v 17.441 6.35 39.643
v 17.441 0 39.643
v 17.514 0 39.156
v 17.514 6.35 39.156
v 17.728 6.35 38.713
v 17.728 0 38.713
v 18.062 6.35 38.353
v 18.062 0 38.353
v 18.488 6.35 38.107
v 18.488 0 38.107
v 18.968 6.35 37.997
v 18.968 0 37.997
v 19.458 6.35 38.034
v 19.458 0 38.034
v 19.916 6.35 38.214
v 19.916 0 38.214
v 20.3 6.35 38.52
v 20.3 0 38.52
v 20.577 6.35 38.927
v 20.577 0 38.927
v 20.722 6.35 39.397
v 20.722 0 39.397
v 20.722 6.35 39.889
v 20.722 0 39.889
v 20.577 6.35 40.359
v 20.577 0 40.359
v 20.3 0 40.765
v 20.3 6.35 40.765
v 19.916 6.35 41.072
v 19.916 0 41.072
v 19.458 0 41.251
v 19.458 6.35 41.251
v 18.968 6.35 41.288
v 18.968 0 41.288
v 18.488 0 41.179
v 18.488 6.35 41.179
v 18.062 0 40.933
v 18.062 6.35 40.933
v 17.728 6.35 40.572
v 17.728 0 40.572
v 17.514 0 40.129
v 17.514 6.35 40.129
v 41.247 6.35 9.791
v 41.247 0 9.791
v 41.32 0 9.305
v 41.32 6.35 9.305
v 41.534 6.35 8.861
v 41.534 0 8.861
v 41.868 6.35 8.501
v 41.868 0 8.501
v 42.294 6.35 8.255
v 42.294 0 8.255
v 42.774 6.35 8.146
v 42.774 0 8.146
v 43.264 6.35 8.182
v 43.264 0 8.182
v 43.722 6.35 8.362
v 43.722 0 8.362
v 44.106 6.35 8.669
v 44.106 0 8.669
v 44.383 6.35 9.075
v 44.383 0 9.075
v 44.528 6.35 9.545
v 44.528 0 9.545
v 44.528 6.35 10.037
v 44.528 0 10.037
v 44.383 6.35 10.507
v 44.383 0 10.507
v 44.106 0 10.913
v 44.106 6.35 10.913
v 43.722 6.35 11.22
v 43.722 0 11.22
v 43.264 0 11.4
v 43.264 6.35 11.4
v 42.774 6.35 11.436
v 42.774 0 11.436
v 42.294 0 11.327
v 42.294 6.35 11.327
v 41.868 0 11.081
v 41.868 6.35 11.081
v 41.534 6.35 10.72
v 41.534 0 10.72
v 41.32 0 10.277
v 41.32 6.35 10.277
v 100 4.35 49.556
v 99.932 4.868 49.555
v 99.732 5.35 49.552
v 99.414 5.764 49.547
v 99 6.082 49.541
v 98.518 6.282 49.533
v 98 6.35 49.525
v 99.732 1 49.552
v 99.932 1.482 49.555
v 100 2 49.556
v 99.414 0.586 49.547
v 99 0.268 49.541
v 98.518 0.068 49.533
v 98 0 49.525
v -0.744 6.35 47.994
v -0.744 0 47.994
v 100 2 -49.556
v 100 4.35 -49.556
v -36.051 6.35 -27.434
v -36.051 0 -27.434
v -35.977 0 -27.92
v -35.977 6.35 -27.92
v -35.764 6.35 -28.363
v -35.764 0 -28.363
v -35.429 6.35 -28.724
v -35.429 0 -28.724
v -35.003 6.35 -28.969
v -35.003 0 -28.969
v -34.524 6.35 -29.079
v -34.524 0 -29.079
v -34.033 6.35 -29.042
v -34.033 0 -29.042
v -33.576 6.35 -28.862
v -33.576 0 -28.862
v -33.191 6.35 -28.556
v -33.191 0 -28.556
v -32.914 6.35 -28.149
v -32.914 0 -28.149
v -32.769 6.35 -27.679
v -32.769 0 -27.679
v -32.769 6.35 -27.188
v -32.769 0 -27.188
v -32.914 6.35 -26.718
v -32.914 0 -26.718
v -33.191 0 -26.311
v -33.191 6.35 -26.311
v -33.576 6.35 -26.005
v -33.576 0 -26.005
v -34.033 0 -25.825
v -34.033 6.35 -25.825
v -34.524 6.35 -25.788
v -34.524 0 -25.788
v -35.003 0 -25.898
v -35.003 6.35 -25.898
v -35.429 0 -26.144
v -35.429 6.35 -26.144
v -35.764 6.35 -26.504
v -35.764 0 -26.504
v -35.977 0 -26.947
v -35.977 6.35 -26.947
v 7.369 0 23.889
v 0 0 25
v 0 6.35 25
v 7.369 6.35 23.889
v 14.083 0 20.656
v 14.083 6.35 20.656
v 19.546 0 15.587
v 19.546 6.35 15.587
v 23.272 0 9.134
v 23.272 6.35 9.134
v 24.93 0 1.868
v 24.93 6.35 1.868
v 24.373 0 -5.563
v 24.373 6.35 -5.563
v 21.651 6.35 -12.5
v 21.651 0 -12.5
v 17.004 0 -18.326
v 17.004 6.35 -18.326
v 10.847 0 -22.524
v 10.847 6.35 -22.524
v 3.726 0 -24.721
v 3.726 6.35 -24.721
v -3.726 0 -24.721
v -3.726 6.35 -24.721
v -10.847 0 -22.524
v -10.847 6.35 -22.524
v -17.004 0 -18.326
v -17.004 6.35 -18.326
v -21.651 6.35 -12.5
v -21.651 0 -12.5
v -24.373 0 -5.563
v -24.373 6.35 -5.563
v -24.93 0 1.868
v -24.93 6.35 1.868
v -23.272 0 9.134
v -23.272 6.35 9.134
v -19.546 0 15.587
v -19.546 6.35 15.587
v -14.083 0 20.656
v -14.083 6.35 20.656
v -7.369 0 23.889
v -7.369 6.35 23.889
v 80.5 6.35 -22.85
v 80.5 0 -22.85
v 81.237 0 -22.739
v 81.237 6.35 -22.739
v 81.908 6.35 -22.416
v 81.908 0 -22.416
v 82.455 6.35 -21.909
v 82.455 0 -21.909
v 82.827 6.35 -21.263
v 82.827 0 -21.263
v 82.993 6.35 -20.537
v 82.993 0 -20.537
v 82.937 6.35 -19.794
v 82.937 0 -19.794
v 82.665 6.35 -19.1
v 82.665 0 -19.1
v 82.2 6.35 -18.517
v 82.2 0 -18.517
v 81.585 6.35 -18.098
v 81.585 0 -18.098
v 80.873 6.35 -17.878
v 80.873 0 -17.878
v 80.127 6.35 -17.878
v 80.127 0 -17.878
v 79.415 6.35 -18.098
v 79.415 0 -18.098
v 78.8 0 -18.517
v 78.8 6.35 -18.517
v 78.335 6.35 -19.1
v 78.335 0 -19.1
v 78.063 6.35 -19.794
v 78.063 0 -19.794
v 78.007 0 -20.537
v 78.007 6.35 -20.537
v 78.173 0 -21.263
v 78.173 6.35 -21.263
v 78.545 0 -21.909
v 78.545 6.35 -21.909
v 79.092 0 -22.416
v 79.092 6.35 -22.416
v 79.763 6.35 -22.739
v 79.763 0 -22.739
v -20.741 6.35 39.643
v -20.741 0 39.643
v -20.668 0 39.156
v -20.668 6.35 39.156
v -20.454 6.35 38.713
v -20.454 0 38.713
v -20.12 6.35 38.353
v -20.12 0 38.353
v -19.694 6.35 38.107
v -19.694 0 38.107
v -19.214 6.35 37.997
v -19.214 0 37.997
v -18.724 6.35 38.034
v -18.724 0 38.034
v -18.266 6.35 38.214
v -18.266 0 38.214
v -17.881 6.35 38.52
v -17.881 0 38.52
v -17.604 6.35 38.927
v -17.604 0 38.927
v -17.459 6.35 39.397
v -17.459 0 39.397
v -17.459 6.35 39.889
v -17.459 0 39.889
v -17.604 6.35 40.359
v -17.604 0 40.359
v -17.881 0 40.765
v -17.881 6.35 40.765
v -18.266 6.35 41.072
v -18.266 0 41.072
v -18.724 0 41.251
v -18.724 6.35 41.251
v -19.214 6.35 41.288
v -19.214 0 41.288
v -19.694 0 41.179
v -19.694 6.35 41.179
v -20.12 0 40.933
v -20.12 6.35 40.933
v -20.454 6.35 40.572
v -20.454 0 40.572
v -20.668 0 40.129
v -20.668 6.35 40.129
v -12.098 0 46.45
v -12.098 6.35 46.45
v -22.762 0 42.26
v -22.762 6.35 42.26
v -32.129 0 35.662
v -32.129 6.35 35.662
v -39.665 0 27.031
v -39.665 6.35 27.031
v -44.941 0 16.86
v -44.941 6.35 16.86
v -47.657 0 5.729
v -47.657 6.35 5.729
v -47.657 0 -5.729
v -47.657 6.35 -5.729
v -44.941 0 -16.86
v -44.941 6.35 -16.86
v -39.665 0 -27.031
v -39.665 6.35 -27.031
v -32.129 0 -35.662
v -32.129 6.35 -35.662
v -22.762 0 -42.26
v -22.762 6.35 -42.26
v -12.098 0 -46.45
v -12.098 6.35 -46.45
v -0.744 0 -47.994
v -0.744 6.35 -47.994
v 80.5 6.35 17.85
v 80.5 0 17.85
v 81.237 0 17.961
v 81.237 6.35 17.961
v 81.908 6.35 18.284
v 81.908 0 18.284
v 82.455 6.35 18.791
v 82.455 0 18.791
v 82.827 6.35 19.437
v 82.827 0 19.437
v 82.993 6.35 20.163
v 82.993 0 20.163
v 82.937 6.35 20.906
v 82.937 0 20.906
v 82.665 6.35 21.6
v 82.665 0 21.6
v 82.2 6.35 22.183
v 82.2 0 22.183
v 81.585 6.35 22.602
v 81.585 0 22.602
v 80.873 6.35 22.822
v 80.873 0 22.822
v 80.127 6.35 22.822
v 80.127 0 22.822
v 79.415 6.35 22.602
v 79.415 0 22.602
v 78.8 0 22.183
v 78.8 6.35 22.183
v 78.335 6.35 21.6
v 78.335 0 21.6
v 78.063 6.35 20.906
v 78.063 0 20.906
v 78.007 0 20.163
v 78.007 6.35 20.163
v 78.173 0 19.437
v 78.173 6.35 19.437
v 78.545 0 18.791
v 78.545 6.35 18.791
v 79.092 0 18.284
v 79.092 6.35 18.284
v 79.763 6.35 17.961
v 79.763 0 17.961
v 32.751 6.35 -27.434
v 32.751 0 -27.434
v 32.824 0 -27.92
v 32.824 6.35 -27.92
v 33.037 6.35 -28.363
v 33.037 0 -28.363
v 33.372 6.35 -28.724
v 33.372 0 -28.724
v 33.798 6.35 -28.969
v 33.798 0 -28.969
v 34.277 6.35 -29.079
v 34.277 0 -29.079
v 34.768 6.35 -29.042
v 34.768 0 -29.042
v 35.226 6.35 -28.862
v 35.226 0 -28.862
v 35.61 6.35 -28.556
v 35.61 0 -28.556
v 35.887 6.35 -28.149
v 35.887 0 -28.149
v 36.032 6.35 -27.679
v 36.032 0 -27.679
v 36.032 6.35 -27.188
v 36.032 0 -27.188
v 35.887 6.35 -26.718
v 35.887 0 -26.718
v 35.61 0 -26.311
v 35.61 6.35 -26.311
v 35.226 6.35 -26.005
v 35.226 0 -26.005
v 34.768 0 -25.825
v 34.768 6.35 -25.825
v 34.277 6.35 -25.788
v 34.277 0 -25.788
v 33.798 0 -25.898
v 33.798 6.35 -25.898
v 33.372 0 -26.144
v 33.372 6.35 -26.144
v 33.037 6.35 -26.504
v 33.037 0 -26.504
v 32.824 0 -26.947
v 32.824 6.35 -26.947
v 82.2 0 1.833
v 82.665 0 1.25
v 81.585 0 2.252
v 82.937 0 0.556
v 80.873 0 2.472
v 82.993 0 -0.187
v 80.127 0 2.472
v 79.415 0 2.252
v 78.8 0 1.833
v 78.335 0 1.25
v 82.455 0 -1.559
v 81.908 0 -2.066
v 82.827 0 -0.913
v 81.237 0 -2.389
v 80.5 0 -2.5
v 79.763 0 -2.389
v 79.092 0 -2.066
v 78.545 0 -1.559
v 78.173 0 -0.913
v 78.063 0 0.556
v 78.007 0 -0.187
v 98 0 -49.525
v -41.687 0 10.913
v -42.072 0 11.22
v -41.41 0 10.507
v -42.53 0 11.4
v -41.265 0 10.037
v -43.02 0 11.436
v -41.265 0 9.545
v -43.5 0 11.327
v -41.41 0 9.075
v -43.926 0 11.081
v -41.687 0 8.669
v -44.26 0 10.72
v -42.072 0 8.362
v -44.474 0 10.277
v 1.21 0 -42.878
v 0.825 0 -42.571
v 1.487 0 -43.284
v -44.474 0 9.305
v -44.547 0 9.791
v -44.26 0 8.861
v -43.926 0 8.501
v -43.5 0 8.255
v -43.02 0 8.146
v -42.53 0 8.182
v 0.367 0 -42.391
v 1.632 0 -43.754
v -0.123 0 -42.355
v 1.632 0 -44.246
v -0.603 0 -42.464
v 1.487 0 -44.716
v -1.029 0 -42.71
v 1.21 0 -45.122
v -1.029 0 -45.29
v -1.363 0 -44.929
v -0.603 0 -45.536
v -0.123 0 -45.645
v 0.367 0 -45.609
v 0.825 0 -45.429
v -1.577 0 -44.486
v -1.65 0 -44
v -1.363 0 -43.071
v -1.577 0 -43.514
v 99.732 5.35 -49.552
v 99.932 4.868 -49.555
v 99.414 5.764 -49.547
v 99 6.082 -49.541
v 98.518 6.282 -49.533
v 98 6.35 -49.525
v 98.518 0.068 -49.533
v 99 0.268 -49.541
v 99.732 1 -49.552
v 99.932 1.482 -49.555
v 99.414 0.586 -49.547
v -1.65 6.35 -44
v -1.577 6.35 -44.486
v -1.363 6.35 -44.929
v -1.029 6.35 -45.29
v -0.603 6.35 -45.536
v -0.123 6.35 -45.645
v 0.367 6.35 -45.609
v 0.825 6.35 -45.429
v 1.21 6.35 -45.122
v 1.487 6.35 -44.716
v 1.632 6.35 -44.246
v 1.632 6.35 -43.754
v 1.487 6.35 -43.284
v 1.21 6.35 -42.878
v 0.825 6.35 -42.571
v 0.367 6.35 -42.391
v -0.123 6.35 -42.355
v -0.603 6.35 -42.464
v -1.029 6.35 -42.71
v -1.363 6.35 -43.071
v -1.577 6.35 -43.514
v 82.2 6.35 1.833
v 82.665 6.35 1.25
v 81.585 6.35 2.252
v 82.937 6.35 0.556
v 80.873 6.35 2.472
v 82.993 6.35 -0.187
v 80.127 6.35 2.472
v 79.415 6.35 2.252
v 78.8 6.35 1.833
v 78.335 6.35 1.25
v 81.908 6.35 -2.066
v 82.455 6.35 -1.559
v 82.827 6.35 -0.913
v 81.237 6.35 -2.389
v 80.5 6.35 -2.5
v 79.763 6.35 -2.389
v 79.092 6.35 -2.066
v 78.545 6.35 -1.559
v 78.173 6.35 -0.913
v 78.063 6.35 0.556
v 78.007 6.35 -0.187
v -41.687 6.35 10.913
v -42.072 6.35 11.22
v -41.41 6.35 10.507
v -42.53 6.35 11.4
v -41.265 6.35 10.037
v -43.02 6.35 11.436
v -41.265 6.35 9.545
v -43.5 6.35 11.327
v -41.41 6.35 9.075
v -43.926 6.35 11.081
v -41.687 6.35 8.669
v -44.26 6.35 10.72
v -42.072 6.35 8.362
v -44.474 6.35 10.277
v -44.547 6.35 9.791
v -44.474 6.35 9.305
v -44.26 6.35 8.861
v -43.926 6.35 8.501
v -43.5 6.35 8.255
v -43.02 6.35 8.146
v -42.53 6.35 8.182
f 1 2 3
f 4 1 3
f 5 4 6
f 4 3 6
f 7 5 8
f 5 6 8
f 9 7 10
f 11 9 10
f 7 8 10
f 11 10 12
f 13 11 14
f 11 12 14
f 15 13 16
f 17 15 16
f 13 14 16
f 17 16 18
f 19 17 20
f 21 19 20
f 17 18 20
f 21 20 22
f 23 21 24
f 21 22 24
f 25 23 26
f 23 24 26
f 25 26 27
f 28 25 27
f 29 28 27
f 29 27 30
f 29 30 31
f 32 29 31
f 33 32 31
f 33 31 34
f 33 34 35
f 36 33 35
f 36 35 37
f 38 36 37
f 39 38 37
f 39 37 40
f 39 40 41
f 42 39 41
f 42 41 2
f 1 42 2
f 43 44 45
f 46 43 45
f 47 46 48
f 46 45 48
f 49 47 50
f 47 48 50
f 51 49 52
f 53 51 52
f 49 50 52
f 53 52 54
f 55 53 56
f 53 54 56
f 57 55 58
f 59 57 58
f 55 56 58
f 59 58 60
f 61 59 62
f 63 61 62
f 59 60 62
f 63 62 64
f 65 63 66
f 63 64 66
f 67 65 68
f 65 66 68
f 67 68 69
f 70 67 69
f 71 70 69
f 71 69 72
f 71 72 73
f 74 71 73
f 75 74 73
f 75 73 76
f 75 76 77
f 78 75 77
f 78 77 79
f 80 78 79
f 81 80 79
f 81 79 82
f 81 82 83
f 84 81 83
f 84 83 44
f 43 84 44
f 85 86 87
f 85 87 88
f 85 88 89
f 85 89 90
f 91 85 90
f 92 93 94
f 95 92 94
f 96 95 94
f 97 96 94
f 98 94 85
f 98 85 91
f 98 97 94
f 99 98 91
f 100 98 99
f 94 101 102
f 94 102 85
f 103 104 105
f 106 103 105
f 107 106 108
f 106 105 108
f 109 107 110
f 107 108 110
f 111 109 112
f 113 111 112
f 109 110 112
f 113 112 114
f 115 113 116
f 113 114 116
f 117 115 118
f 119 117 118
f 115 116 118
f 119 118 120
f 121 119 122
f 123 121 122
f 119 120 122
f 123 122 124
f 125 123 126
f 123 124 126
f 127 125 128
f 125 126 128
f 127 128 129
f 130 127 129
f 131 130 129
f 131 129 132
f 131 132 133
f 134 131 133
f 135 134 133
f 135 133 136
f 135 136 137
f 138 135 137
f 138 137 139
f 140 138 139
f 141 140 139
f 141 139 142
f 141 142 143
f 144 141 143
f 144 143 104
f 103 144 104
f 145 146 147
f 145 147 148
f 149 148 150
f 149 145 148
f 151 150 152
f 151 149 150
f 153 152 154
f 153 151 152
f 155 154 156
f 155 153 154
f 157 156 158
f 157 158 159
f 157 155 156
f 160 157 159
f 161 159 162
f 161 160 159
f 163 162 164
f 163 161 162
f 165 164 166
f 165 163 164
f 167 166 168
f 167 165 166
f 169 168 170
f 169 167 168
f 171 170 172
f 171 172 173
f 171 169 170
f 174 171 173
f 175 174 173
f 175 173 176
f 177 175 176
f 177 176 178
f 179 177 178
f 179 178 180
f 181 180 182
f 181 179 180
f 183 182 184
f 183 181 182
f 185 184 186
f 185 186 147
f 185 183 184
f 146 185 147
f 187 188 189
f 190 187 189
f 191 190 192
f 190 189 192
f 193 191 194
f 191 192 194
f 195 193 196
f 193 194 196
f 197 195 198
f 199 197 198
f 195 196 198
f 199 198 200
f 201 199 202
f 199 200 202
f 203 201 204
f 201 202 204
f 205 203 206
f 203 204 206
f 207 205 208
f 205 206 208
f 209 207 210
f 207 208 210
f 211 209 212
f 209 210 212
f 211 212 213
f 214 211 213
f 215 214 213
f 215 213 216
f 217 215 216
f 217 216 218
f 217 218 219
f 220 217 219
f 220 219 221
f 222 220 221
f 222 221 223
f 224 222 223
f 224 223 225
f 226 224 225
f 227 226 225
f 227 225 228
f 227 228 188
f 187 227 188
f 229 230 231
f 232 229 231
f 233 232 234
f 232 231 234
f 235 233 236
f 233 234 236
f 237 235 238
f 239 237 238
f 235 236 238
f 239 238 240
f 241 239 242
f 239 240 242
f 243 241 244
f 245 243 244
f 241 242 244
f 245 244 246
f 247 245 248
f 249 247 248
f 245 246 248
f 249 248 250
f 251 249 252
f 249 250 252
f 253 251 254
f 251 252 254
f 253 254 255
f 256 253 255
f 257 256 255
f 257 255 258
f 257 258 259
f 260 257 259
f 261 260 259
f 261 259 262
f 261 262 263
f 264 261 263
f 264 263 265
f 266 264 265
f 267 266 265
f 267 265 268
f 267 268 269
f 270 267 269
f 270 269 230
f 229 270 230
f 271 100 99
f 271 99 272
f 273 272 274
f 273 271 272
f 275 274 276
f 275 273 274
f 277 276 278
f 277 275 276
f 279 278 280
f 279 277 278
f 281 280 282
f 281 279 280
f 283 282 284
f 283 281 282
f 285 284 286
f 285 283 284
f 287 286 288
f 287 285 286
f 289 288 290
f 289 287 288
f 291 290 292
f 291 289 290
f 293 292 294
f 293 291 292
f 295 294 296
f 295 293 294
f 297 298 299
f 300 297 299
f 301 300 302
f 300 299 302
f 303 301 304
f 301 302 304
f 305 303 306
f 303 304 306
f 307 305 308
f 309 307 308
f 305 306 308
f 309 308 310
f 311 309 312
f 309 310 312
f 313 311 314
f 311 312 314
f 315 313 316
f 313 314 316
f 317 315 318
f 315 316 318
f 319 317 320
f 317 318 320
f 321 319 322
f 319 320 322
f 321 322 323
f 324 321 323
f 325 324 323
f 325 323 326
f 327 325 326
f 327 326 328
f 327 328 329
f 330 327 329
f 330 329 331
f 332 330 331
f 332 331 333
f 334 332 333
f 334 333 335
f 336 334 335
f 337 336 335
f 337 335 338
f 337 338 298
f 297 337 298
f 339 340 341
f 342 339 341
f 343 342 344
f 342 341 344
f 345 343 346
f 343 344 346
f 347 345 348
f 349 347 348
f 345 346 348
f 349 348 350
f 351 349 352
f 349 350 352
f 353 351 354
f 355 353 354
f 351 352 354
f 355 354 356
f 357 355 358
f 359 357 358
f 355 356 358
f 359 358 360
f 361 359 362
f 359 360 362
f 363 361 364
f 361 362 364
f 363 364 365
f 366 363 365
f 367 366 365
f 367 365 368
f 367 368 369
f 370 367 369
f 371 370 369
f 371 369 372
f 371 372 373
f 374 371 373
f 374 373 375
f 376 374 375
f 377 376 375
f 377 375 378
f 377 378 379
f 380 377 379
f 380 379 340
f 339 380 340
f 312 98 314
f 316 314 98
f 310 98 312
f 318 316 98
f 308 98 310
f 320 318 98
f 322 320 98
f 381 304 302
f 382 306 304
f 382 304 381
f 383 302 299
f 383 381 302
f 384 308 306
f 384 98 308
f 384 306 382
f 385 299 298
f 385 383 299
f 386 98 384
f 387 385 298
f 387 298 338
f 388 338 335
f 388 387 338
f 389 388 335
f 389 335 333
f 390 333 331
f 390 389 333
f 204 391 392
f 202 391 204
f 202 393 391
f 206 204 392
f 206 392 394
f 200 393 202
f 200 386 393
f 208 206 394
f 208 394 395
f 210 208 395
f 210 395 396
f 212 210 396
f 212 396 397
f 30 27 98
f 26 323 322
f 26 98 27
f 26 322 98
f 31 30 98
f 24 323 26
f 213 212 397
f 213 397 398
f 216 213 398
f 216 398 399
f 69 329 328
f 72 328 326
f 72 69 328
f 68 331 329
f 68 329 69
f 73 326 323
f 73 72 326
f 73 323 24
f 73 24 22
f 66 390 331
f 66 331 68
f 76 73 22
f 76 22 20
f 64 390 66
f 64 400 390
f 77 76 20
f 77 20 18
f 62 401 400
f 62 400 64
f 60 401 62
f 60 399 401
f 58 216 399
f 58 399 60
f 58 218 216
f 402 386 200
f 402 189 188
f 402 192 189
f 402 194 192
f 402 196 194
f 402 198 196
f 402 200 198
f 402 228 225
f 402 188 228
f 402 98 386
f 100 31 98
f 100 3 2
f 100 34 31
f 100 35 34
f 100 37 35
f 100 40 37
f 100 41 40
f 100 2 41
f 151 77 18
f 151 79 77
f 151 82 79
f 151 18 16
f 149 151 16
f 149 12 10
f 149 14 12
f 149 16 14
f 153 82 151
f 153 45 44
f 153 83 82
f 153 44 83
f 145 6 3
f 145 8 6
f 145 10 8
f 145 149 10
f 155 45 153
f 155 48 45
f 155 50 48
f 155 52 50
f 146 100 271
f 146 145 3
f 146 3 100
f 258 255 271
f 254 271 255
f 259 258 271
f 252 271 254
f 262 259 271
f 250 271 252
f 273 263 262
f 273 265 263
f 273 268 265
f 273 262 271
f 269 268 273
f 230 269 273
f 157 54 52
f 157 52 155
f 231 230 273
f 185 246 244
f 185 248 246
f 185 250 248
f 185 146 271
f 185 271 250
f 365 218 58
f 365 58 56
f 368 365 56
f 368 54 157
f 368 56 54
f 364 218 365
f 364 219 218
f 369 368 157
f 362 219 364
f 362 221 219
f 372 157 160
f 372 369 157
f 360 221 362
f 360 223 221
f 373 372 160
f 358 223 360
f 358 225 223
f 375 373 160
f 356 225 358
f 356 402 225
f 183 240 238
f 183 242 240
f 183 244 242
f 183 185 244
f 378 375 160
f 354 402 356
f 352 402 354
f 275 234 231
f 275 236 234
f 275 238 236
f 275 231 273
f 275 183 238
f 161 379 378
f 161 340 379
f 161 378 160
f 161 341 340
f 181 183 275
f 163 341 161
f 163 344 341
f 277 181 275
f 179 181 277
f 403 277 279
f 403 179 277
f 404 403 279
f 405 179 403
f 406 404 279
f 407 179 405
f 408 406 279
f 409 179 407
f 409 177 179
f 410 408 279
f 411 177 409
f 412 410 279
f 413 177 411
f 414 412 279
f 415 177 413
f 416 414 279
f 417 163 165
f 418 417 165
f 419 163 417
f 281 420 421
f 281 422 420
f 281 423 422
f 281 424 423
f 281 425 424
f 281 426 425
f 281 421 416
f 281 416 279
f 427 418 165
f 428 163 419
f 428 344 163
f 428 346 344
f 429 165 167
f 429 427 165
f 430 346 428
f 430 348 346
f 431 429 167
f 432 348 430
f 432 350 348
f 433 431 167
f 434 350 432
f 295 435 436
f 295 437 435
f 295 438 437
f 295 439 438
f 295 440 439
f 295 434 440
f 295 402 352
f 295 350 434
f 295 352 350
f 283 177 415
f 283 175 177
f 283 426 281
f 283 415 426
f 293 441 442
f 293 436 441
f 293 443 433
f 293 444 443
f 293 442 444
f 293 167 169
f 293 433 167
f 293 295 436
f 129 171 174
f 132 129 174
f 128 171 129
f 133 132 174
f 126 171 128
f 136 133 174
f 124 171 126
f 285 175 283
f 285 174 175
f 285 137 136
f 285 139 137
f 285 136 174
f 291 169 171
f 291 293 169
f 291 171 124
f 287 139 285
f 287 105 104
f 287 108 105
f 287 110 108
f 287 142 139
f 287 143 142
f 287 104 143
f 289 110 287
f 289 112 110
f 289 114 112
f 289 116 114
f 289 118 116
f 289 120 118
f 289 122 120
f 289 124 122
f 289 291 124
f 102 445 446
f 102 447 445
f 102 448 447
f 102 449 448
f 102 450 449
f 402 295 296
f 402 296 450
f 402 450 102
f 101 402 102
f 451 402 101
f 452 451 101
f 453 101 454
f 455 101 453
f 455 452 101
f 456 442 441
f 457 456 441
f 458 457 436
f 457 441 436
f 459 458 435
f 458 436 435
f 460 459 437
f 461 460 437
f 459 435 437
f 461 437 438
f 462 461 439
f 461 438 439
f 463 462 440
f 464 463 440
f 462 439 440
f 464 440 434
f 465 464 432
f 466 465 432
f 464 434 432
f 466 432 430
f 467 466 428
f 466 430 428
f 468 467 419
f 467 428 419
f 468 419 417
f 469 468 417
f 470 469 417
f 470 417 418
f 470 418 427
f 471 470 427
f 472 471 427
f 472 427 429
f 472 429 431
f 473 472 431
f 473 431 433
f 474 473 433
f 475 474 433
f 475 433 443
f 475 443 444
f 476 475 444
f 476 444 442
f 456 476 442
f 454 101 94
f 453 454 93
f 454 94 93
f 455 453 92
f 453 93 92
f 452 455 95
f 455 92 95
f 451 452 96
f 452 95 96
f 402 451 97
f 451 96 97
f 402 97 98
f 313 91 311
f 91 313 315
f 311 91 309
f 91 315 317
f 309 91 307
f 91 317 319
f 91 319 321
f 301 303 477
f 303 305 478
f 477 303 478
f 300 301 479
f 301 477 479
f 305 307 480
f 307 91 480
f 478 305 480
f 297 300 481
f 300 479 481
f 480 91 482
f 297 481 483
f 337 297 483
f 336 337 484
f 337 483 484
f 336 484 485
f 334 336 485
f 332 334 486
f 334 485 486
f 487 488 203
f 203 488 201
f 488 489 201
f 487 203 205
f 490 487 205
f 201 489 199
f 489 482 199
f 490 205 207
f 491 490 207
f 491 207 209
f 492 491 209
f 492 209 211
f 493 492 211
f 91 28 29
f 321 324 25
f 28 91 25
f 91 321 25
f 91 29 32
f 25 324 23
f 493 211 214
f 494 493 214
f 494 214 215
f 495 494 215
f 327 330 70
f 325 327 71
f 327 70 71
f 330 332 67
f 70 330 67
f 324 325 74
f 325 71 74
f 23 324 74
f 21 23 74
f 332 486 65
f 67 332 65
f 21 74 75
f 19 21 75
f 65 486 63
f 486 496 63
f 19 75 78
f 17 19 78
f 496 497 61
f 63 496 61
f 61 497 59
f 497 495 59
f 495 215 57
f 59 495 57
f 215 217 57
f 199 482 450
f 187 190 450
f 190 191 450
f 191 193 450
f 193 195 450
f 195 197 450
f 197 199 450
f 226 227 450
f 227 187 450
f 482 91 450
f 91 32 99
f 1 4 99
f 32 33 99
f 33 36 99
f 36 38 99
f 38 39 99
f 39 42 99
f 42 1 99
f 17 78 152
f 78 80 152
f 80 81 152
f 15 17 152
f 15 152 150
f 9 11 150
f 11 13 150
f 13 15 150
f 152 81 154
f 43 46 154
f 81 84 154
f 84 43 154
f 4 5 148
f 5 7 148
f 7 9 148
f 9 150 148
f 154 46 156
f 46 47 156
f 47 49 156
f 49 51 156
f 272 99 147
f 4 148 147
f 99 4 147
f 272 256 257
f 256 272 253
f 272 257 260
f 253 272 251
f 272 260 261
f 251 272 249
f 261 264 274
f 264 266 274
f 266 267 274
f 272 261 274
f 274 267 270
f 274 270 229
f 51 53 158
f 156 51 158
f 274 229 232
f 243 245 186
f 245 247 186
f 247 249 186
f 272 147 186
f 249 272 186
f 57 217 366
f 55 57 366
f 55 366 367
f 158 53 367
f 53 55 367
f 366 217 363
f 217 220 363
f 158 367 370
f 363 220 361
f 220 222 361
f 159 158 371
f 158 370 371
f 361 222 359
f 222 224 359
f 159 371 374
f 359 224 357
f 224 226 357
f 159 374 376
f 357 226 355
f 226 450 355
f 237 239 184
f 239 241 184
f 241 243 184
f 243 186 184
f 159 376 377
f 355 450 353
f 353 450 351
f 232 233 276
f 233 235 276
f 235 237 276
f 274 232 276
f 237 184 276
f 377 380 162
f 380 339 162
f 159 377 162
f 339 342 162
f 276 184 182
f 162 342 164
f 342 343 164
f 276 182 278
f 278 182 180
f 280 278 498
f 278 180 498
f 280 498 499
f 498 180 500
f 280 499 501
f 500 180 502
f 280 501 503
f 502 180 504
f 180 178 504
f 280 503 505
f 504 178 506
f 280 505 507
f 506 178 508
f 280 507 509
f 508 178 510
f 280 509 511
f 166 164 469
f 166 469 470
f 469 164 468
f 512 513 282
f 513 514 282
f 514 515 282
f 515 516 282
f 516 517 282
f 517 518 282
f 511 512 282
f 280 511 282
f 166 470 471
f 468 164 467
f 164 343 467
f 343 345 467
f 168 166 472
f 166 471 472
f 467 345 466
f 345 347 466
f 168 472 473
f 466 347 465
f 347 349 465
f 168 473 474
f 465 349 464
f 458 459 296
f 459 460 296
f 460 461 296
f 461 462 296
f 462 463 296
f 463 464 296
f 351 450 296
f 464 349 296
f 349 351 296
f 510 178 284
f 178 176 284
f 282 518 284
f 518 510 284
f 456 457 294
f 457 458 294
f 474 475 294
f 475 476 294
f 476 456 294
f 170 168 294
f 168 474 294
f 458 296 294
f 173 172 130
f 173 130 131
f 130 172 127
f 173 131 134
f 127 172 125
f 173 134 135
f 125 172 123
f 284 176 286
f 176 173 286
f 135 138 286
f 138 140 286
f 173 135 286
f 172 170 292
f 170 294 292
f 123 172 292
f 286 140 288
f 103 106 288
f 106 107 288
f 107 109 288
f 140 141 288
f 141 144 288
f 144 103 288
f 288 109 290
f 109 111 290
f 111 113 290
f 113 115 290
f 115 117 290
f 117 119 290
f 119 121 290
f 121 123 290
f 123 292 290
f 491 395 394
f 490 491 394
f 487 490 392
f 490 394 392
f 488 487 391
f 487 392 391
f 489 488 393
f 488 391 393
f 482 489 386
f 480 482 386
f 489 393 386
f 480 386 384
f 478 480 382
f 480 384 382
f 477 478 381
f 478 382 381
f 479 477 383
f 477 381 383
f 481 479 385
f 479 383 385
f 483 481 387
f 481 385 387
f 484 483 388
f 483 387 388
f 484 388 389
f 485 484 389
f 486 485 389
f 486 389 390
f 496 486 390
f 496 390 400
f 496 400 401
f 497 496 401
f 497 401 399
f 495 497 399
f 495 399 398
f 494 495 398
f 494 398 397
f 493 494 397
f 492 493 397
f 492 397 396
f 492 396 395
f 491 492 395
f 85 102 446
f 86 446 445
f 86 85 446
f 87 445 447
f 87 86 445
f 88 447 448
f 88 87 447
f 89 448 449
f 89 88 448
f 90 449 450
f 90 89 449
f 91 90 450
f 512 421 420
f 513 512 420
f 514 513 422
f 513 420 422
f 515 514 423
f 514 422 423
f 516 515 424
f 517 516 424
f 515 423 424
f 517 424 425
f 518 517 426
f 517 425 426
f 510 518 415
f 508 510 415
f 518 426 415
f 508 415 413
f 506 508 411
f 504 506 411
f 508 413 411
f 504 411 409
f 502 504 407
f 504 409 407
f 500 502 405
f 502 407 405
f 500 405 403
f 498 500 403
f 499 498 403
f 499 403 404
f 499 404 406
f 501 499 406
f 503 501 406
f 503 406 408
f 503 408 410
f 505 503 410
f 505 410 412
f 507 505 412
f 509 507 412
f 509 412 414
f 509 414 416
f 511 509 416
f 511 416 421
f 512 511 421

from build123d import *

# Parameters (mm, degrees)
SKETCH1_R                 = 0.5
SKETCH1_R_2               = 25
BOSS_EXTRUDE1_DEPTH       = 6.35
M6X1_0_TAPPED_HOLE1_D     = 5
M6X1_0_TAPPED_HOLE1_DEPTH = 15
M6X1_0_TAPPED_HOLE1_TIP   = 1.502151548
M4X0_7_TAPPED_HOLE1_D     = 3.3
M4X0_7_TAPPED_HOLE1_DEPTH = 10.1
M4X0_7_TAPPED_HOLE1_TIP   = 0.991420021
FILLET1_R                 = 2


with BuildPart() as part:
    # Sketch1 → Boss-Extrude1 (new body)
    with BuildSketch(Plane(origin=(0, 0, 0), x_dir=(1, 0, 0), z_dir=(0, 1, 0))):
        with BuildLine():
            Line((100, -49.556343888), (100, 49.556343888))
            Line((100, 49.556343888), (-0.744186047, 47.994230769))
            ThreePointArc((-0.744186047, 47.994230769), (-48, 0), (-0.744186047, -47.994230769))
            Line((-0.744186047, -47.994230769), (100, -49.556343888))
        make_face()
        with Locations((80.5, -20.35)):
            Circle(SKETCH1_R, mode=Mode.SUBTRACT)
        Circle(SKETCH1_R_2, mode=Mode.SUBTRACT)
        with Locations((80.5, 0)):
            Circle(SKETCH1_R, mode=Mode.SUBTRACT)
        with Locations((80.5, 20.35)):
            Circle(SKETCH1_R, mode=Mode.SUBTRACT)
    extrude(amount=BOSS_EXTRUDE1_DEPTH)

    # M6x1.0 Tapped Hole1
    with Locations(Plane(origin=(80.5, 6.35, -20.35), x_dir=(0, 0, 1), z_dir=(0, 1, 0))):
        with Locations((0, 0), (20.35, 0), (40.7, 0)):
            Hole(M6X1_0_TAPPED_HOLE1_D / 2, depth=M6X1_0_TAPPED_HOLE1_DEPTH)
            with Locations((0, 0, -(M6X1_0_TAPPED_HOLE1_DEPTH + M6X1_0_TAPPED_HOLE1_TIP / 2))):  # 118° drill point
                Cone(0, M6X1_0_TAPPED_HOLE1_D / 2, M6X1_0_TAPPED_HOLE1_TIP, mode=Mode.SUBTRACT)

    # M4x0.7 Tapped Hole1
    with Locations(Plane(origin=(0, 6.35, 0), x_dir=(1, 0, 0), z_dir=(0, 1, 0))):
        with Locations((-34.400585229, 27.433551282), (0, 44), (34.400585229, 27.433551282), (42.896828136, -9.790921094), (19.090884521, -39.642630188), (-19.090884521, -39.642630188), (-42.896828136, -9.790921094)):
            Hole(M4X0_7_TAPPED_HOLE1_D / 2, depth=M4X0_7_TAPPED_HOLE1_DEPTH)
            with Locations((0, 0, -(M4X0_7_TAPPED_HOLE1_DEPTH + M4X0_7_TAPPED_HOLE1_TIP / 2))):  # 118° drill point
                Cone(0, M4X0_7_TAPPED_HOLE1_D / 2, M4X0_7_TAPPED_HOLE1_TIP, mode=Mode.SUBTRACT)

    # Fillet1
    fillet1_edges = [part.edges().sort_by_distance(p)[0] for p in [
        (100, 0, 0),
        (100, 6.35, 0),
    ]]
    fillet(fillet1_edges, radius=FILLET1_R)


solid = part.part
